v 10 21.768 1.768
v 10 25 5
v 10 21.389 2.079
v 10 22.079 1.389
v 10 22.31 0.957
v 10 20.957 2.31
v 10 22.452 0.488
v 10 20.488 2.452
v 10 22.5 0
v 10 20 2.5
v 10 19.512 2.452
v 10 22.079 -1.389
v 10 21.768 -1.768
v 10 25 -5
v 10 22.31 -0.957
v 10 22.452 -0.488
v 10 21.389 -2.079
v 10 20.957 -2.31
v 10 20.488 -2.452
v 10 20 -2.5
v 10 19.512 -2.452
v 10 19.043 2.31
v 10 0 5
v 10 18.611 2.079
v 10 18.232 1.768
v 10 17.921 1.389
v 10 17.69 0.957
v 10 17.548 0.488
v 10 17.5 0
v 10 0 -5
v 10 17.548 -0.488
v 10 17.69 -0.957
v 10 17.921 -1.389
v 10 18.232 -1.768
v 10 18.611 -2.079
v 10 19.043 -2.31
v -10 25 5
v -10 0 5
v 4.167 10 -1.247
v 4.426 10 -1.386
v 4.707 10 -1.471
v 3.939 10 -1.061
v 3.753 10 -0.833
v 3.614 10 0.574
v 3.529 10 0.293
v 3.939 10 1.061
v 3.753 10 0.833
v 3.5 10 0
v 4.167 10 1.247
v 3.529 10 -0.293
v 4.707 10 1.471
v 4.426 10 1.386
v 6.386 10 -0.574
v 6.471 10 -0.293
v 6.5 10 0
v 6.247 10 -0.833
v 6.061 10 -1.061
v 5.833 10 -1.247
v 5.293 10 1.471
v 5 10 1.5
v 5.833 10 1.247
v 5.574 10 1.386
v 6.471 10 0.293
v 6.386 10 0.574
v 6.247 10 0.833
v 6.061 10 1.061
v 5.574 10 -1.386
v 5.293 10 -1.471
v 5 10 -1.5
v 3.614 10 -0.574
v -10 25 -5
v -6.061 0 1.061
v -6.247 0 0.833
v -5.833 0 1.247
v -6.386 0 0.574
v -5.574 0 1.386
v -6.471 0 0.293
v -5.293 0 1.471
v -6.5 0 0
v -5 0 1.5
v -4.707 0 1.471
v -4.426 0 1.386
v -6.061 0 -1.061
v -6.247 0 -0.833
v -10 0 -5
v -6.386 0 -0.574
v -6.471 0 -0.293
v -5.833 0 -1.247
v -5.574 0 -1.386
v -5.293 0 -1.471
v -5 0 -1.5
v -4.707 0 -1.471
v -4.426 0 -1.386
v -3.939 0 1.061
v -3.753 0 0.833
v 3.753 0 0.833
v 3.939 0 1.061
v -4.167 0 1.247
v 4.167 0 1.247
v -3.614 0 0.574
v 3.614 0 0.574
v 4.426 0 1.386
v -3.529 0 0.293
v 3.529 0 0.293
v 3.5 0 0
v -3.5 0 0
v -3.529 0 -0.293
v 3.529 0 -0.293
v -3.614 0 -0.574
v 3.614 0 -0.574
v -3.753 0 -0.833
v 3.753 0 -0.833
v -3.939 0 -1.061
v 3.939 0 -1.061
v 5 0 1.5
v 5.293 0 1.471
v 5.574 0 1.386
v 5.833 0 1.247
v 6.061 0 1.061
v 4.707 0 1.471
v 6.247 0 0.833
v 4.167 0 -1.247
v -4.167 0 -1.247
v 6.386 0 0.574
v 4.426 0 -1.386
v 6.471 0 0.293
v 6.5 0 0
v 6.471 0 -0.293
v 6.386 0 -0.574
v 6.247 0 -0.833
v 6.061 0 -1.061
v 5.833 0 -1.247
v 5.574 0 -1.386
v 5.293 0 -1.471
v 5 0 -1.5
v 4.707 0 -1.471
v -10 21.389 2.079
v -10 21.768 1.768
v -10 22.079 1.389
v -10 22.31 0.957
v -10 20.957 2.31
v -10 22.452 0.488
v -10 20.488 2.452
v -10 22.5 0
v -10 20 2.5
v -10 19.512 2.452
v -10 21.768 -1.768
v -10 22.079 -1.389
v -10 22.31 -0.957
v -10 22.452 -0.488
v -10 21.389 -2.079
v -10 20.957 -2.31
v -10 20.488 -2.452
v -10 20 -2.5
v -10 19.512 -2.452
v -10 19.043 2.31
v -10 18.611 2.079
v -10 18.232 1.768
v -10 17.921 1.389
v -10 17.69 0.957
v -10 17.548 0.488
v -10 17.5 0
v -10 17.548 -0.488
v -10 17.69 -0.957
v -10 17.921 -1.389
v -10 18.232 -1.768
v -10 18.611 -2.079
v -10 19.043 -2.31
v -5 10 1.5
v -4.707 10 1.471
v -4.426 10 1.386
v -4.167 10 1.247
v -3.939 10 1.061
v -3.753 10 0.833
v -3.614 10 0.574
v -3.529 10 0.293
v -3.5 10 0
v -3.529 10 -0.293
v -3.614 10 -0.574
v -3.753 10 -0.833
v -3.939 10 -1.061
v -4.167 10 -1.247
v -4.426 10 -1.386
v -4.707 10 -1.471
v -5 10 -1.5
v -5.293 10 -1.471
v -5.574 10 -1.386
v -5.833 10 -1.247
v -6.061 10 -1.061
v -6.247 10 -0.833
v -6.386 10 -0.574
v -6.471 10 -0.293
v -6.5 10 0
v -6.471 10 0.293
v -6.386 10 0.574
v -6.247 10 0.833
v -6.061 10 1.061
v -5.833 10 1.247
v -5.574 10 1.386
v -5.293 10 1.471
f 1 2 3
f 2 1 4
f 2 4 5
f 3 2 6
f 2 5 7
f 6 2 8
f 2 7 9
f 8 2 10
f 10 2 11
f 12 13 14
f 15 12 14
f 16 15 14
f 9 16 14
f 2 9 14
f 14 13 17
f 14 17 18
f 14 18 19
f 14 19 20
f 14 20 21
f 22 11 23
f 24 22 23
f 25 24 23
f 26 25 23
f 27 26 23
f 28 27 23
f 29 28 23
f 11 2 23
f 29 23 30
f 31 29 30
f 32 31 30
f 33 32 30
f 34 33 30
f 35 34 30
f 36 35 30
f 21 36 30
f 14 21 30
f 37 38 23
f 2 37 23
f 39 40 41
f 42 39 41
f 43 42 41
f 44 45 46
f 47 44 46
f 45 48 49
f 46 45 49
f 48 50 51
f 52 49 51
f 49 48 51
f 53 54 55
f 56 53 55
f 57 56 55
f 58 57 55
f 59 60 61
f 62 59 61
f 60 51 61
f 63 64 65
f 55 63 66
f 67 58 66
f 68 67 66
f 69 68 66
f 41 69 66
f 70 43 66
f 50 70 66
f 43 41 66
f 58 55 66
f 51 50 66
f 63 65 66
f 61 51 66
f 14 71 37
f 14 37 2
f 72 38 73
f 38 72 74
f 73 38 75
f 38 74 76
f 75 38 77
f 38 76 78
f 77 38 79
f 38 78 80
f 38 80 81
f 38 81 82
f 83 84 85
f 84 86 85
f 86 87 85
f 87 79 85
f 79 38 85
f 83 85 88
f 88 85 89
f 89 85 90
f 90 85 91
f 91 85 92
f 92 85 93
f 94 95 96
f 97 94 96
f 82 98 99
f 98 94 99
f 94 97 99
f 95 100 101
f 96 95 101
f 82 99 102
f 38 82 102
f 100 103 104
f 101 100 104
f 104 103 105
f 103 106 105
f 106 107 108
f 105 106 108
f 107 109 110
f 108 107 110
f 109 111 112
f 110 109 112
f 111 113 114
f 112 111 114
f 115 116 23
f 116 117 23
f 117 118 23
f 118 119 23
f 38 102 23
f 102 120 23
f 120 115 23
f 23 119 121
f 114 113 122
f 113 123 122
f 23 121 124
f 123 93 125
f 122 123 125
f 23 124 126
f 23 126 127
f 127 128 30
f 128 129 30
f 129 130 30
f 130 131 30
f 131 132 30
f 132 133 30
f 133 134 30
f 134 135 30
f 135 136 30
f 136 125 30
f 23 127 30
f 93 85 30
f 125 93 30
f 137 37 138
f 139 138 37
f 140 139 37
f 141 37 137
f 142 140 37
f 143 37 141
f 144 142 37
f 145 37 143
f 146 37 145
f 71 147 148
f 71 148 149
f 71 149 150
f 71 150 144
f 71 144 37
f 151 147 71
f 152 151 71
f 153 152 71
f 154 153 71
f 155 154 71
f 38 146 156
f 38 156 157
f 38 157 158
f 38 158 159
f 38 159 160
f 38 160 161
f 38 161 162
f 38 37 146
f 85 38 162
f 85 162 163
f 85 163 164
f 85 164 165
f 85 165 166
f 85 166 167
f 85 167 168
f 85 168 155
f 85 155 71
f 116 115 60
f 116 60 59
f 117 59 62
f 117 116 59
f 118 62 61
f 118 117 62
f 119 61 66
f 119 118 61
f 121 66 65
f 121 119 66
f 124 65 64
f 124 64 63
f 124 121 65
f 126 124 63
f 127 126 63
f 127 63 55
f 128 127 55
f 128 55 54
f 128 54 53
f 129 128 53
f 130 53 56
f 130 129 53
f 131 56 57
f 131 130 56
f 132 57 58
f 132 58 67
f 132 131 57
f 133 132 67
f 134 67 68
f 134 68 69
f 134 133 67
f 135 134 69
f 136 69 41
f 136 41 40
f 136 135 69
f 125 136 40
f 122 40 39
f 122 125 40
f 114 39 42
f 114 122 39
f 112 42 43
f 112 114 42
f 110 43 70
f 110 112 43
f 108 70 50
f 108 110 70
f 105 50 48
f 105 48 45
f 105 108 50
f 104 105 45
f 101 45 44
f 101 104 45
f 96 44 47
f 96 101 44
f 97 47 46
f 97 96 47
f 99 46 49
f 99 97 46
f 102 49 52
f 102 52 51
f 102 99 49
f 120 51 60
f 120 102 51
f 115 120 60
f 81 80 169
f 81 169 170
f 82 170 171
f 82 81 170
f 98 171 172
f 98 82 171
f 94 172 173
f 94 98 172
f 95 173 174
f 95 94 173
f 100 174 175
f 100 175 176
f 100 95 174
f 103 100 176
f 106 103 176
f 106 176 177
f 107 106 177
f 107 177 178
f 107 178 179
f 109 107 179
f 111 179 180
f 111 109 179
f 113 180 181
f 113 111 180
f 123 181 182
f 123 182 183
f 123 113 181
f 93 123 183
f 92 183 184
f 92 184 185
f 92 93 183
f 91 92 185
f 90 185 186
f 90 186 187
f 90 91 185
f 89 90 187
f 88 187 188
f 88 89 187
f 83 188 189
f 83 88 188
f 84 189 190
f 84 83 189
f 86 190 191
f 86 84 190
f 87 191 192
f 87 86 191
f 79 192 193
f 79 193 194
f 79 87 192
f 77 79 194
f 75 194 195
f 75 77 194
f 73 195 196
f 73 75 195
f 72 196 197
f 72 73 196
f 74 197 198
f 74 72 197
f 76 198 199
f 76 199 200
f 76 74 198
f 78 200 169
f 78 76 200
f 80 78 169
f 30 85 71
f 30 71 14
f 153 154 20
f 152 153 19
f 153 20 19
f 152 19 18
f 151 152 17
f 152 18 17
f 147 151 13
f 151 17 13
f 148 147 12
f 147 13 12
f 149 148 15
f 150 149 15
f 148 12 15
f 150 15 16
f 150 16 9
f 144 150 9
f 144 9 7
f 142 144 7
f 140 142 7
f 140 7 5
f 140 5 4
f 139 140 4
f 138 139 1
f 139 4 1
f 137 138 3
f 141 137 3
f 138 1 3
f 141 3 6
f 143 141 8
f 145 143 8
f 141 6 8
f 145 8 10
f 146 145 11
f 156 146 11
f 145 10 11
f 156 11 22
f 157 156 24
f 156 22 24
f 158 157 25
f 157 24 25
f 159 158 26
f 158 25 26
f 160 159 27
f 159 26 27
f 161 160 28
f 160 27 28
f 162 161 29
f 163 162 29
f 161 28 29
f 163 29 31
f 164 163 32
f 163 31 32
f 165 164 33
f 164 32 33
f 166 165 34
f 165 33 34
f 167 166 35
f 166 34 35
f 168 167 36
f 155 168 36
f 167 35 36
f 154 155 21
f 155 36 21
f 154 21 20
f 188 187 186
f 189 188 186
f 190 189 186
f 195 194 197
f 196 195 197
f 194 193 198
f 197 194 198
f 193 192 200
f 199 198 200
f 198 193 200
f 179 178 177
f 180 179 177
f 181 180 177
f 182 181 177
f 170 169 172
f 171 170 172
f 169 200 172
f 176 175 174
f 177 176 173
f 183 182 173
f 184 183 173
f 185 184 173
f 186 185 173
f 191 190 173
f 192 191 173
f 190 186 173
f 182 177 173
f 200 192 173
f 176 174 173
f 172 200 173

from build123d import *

# Parameters (mm, degrees)
SKETCH1_W           = 20
SKETCH1_H           = 10
BOSS_EXTRUDE1_DEPTH = 25
SKETCH2_R           = 1.5
CUT_EXTRUDE1_DEPTH  = 10
SKETCH3_R           = 2.5
CUT_EXTRUDE2_DEPTH  = 20


with BuildPart() as part:
    # Sketch1 → Boss-Extrude1 (new body)
    with BuildSketch(Plane(origin=(0, 0, 0), x_dir=(1, 0, 0), z_dir=(0, 1, 0))):
        Rectangle(SKETCH1_W, SKETCH1_H)
    extrude(amount=BOSS_EXTRUDE1_DEPTH)

    # Sketch2 → Cut-Extrude1 (cut)
    with BuildSketch(Plane(origin=(0, 0, 0), x_dir=(1, 0, 0), z_dir=(0, 1, 0))):
        with Locations(Location((-5, 0, 0), (0, 0, 270))):
            Circle(SKETCH2_R)
        with Locations(Location((5, 0, 0), (0, 0, 270))):
            Circle(SKETCH2_R)
    extrude(amount=CUT_EXTRUDE1_DEPTH, mode=Mode.SUBTRACT)

    # Sketch3 → Cut-Extrude2 (cut, symmetric)
    with BuildSketch(Plane(origin=(0, 0, 0), x_dir=(0, 0, -1), z_dir=(1, 0, 0))):
        with Locations((0, 20)):
            Circle(SKETCH3_R)
    extrude(amount=CUT_EXTRUDE2_DEPTH, both=True, mode=Mode.SUBTRACT)


solid = part.part
